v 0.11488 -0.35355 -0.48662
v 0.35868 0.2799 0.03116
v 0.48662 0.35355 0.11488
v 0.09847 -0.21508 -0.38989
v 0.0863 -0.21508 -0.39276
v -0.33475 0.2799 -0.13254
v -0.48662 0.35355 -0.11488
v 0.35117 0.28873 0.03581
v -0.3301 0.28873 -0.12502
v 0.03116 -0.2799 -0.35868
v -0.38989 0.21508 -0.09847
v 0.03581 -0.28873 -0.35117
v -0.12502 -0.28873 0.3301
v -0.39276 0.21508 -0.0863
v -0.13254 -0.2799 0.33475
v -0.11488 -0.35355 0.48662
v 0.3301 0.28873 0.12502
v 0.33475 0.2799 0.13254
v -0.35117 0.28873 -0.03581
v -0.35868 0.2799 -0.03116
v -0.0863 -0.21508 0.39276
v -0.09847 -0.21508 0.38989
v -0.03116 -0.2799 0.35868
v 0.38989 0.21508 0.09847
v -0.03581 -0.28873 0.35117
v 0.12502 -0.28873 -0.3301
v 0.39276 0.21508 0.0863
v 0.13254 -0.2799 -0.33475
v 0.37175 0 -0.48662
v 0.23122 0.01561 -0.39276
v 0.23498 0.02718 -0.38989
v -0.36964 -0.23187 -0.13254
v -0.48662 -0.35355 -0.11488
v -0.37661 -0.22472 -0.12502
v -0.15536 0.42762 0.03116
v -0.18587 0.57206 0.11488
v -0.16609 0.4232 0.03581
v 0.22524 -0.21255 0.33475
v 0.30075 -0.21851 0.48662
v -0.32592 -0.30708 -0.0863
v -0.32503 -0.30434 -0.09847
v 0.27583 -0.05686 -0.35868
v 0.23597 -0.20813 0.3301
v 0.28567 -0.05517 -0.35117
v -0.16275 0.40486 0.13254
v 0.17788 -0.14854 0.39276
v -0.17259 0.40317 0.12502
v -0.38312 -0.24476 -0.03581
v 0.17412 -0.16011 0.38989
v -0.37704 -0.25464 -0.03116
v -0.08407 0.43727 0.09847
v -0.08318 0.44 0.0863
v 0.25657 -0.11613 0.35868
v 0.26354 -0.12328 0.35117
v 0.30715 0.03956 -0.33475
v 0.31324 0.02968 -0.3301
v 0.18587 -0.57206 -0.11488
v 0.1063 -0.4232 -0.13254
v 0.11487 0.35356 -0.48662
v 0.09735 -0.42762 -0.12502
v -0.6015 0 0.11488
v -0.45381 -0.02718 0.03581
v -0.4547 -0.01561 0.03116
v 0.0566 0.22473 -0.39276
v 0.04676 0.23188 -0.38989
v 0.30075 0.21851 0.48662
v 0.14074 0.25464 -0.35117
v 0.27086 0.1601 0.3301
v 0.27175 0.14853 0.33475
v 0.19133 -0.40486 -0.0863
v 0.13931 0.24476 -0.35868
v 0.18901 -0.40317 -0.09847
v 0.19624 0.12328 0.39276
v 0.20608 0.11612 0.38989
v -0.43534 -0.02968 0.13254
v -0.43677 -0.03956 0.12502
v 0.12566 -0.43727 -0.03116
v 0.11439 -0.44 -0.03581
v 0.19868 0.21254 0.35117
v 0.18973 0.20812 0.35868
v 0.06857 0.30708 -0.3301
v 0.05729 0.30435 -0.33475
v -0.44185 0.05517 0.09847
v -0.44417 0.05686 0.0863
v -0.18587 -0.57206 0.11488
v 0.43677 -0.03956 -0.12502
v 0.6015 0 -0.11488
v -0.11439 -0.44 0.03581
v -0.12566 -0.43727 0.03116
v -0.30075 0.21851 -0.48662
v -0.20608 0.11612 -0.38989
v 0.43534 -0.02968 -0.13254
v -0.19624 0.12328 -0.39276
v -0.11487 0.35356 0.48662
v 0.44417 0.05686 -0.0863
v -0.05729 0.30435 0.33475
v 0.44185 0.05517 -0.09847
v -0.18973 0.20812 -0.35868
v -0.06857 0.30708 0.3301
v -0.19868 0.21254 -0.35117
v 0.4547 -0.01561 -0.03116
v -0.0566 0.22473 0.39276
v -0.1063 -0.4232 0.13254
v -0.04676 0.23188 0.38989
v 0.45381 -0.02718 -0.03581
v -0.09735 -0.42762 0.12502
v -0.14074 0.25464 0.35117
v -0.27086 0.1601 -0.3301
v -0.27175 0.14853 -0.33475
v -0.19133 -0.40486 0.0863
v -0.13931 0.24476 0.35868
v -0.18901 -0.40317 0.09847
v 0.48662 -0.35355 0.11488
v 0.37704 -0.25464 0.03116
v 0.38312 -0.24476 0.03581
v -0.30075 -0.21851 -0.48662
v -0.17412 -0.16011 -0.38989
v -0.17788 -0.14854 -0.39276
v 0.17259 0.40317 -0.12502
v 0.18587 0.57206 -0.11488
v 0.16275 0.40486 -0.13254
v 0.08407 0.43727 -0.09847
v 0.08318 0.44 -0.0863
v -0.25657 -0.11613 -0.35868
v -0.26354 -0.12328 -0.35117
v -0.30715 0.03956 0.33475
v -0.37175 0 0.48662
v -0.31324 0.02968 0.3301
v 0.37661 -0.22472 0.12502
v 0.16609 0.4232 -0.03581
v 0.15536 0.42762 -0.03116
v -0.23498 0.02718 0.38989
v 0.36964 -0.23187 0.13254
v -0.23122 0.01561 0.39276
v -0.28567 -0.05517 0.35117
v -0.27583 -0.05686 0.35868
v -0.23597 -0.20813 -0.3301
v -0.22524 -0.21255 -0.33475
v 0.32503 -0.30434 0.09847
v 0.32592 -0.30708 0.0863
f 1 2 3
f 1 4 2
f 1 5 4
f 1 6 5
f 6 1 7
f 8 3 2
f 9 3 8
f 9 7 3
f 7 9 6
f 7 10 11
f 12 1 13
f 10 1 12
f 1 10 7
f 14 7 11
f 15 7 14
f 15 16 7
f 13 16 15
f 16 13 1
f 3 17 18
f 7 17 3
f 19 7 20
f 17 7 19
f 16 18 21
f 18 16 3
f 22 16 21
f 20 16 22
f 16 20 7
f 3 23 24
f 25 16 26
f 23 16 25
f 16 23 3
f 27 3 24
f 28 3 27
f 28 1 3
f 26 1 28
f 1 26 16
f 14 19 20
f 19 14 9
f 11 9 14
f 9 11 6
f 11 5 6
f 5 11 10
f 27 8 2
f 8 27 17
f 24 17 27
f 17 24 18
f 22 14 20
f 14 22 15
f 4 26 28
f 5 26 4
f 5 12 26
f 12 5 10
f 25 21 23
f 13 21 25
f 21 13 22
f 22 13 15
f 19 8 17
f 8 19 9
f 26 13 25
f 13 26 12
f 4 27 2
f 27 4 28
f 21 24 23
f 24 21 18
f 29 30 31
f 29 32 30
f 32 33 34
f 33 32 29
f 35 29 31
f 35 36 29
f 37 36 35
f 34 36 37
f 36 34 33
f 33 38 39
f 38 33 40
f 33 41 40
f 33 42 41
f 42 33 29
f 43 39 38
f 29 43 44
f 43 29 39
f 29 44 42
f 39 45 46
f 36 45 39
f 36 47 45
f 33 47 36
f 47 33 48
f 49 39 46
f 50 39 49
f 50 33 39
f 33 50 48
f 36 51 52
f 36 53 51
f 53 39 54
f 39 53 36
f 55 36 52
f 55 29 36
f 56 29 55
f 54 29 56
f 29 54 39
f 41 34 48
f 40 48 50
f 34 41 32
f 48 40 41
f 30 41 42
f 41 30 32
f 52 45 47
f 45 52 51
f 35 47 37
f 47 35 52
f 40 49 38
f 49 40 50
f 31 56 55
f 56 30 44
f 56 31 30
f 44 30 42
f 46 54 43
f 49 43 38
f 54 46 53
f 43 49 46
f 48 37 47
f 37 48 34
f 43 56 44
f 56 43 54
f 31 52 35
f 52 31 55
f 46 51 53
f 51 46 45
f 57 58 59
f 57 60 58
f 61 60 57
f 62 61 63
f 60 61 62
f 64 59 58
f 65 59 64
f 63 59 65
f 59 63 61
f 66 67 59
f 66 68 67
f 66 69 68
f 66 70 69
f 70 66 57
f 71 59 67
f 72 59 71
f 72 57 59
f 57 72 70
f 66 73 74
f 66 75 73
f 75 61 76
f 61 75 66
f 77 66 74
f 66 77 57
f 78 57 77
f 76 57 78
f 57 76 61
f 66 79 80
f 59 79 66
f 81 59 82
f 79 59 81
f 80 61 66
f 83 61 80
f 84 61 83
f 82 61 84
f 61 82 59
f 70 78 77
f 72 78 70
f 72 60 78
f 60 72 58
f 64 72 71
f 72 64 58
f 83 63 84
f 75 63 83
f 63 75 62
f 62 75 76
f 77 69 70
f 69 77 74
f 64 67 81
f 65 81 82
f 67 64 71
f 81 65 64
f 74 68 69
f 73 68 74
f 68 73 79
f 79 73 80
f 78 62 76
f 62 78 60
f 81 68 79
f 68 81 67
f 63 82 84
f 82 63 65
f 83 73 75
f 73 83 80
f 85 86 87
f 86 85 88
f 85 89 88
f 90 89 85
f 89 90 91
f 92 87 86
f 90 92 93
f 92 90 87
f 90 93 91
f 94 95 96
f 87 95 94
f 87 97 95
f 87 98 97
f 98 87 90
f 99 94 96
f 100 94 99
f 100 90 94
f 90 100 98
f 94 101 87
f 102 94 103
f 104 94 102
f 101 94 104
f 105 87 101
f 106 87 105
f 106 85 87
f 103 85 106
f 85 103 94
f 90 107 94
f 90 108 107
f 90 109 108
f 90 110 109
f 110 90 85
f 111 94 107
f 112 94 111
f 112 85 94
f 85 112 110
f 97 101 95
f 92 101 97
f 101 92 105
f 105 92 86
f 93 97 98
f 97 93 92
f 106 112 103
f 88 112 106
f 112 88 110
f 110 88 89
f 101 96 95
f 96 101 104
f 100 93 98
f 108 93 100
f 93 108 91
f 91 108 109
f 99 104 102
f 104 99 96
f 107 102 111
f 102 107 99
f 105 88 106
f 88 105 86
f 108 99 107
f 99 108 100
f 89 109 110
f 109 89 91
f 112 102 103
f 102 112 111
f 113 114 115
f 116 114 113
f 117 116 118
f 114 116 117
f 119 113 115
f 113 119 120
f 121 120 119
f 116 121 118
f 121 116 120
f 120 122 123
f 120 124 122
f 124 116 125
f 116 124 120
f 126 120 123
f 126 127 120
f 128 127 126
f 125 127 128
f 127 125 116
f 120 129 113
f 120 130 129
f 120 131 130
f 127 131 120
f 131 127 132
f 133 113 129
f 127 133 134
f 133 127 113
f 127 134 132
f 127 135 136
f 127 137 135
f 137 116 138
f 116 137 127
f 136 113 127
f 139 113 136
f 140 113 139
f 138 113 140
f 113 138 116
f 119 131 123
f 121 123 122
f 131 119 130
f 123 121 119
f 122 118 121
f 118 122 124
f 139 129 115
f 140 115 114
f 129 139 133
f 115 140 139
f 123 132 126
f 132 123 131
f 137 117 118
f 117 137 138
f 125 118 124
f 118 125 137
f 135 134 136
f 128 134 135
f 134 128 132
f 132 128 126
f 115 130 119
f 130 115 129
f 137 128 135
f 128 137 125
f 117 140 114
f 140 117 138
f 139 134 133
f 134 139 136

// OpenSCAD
module hollow_poly(shape_vertices, shape_faces, face_shrink=0.8, hole_grow = 1.05) {
    // Function to find center of a face
    function face_center(vertices, face) = 
        let(
            points = [for(i = face) vertices[i]],
            x = [for(p = points) p[0]],
            y = [for(p = points) p[1]],
            z = [for(p = points) p[2]]
        )
        [(x[0] + x[1] + x[2])/len(face), 
         (y[0] + y[1] + y[2])/len(face), 
         (z[0] + z[1] + z[2])/len(face)];
    
    // Function to shrink a face towards its center
    function shrink_face(vertices, face, shrink_factor) = 
        let(
            center = face_center(vertices, face)
        )
        [for(idx = face)
            let(
                point = vertices[idx],
                vector = point - center
            )
            center + vector * shrink_factor
        ];
    
    // Collect all shrunk faces into a single vertex list
    shrunk_vertices = [
        for(face = shape_faces)
        let(shrunk = shrink_face(shape_vertices, face, face_shrink))
        for(v = shrunk) v
    ];
        
    difference () {
        // polyhedron by itself isn't "water-tight" for difference o_O
        hull() {
            polyhedron(points=shape_vertices, faces=shape_faces);
        }
        
        scale(hole_grow)
        hull() {
            polyhedron(
                points=shrunk_vertices,
                faces=[
                    for(i=[0:len(shrunk_vertices)/3-1])
                    [i*3, i*3+1, i*3+2]
                ]
            );
        }
    }
}

// Tetrahedron basic def via https://github.com/benjamin-edward-morgan/openscad-polyhedra
tetrahedron_vertices = [[1,1,1],[1,-1,-1],[-1,1,-1],[-1,-1,1]]/sqrt(8);
tetrahedron_faces = [[0,1,2],[0,2,3],[0,3,1],[1,3,2]];

colors = ["Red", "Blue", "Green", "Yellow", "Purple"];

// The arcsin(1/3) angle properly aligns the tetrahedron with respect to icosahedral symmetry
initial_rot = [0, 31.717, 0]; // arcsin(1/3) ≈ 31.717°

for(i = [0:4]) {
    color(colors[i])
    rotate([0, 0, i * 360/5])
    rotate(initial_rot)
    hollow_poly(tetrahedron_vertices, tetrahedron_faces, face_shrink=2/3);
}
